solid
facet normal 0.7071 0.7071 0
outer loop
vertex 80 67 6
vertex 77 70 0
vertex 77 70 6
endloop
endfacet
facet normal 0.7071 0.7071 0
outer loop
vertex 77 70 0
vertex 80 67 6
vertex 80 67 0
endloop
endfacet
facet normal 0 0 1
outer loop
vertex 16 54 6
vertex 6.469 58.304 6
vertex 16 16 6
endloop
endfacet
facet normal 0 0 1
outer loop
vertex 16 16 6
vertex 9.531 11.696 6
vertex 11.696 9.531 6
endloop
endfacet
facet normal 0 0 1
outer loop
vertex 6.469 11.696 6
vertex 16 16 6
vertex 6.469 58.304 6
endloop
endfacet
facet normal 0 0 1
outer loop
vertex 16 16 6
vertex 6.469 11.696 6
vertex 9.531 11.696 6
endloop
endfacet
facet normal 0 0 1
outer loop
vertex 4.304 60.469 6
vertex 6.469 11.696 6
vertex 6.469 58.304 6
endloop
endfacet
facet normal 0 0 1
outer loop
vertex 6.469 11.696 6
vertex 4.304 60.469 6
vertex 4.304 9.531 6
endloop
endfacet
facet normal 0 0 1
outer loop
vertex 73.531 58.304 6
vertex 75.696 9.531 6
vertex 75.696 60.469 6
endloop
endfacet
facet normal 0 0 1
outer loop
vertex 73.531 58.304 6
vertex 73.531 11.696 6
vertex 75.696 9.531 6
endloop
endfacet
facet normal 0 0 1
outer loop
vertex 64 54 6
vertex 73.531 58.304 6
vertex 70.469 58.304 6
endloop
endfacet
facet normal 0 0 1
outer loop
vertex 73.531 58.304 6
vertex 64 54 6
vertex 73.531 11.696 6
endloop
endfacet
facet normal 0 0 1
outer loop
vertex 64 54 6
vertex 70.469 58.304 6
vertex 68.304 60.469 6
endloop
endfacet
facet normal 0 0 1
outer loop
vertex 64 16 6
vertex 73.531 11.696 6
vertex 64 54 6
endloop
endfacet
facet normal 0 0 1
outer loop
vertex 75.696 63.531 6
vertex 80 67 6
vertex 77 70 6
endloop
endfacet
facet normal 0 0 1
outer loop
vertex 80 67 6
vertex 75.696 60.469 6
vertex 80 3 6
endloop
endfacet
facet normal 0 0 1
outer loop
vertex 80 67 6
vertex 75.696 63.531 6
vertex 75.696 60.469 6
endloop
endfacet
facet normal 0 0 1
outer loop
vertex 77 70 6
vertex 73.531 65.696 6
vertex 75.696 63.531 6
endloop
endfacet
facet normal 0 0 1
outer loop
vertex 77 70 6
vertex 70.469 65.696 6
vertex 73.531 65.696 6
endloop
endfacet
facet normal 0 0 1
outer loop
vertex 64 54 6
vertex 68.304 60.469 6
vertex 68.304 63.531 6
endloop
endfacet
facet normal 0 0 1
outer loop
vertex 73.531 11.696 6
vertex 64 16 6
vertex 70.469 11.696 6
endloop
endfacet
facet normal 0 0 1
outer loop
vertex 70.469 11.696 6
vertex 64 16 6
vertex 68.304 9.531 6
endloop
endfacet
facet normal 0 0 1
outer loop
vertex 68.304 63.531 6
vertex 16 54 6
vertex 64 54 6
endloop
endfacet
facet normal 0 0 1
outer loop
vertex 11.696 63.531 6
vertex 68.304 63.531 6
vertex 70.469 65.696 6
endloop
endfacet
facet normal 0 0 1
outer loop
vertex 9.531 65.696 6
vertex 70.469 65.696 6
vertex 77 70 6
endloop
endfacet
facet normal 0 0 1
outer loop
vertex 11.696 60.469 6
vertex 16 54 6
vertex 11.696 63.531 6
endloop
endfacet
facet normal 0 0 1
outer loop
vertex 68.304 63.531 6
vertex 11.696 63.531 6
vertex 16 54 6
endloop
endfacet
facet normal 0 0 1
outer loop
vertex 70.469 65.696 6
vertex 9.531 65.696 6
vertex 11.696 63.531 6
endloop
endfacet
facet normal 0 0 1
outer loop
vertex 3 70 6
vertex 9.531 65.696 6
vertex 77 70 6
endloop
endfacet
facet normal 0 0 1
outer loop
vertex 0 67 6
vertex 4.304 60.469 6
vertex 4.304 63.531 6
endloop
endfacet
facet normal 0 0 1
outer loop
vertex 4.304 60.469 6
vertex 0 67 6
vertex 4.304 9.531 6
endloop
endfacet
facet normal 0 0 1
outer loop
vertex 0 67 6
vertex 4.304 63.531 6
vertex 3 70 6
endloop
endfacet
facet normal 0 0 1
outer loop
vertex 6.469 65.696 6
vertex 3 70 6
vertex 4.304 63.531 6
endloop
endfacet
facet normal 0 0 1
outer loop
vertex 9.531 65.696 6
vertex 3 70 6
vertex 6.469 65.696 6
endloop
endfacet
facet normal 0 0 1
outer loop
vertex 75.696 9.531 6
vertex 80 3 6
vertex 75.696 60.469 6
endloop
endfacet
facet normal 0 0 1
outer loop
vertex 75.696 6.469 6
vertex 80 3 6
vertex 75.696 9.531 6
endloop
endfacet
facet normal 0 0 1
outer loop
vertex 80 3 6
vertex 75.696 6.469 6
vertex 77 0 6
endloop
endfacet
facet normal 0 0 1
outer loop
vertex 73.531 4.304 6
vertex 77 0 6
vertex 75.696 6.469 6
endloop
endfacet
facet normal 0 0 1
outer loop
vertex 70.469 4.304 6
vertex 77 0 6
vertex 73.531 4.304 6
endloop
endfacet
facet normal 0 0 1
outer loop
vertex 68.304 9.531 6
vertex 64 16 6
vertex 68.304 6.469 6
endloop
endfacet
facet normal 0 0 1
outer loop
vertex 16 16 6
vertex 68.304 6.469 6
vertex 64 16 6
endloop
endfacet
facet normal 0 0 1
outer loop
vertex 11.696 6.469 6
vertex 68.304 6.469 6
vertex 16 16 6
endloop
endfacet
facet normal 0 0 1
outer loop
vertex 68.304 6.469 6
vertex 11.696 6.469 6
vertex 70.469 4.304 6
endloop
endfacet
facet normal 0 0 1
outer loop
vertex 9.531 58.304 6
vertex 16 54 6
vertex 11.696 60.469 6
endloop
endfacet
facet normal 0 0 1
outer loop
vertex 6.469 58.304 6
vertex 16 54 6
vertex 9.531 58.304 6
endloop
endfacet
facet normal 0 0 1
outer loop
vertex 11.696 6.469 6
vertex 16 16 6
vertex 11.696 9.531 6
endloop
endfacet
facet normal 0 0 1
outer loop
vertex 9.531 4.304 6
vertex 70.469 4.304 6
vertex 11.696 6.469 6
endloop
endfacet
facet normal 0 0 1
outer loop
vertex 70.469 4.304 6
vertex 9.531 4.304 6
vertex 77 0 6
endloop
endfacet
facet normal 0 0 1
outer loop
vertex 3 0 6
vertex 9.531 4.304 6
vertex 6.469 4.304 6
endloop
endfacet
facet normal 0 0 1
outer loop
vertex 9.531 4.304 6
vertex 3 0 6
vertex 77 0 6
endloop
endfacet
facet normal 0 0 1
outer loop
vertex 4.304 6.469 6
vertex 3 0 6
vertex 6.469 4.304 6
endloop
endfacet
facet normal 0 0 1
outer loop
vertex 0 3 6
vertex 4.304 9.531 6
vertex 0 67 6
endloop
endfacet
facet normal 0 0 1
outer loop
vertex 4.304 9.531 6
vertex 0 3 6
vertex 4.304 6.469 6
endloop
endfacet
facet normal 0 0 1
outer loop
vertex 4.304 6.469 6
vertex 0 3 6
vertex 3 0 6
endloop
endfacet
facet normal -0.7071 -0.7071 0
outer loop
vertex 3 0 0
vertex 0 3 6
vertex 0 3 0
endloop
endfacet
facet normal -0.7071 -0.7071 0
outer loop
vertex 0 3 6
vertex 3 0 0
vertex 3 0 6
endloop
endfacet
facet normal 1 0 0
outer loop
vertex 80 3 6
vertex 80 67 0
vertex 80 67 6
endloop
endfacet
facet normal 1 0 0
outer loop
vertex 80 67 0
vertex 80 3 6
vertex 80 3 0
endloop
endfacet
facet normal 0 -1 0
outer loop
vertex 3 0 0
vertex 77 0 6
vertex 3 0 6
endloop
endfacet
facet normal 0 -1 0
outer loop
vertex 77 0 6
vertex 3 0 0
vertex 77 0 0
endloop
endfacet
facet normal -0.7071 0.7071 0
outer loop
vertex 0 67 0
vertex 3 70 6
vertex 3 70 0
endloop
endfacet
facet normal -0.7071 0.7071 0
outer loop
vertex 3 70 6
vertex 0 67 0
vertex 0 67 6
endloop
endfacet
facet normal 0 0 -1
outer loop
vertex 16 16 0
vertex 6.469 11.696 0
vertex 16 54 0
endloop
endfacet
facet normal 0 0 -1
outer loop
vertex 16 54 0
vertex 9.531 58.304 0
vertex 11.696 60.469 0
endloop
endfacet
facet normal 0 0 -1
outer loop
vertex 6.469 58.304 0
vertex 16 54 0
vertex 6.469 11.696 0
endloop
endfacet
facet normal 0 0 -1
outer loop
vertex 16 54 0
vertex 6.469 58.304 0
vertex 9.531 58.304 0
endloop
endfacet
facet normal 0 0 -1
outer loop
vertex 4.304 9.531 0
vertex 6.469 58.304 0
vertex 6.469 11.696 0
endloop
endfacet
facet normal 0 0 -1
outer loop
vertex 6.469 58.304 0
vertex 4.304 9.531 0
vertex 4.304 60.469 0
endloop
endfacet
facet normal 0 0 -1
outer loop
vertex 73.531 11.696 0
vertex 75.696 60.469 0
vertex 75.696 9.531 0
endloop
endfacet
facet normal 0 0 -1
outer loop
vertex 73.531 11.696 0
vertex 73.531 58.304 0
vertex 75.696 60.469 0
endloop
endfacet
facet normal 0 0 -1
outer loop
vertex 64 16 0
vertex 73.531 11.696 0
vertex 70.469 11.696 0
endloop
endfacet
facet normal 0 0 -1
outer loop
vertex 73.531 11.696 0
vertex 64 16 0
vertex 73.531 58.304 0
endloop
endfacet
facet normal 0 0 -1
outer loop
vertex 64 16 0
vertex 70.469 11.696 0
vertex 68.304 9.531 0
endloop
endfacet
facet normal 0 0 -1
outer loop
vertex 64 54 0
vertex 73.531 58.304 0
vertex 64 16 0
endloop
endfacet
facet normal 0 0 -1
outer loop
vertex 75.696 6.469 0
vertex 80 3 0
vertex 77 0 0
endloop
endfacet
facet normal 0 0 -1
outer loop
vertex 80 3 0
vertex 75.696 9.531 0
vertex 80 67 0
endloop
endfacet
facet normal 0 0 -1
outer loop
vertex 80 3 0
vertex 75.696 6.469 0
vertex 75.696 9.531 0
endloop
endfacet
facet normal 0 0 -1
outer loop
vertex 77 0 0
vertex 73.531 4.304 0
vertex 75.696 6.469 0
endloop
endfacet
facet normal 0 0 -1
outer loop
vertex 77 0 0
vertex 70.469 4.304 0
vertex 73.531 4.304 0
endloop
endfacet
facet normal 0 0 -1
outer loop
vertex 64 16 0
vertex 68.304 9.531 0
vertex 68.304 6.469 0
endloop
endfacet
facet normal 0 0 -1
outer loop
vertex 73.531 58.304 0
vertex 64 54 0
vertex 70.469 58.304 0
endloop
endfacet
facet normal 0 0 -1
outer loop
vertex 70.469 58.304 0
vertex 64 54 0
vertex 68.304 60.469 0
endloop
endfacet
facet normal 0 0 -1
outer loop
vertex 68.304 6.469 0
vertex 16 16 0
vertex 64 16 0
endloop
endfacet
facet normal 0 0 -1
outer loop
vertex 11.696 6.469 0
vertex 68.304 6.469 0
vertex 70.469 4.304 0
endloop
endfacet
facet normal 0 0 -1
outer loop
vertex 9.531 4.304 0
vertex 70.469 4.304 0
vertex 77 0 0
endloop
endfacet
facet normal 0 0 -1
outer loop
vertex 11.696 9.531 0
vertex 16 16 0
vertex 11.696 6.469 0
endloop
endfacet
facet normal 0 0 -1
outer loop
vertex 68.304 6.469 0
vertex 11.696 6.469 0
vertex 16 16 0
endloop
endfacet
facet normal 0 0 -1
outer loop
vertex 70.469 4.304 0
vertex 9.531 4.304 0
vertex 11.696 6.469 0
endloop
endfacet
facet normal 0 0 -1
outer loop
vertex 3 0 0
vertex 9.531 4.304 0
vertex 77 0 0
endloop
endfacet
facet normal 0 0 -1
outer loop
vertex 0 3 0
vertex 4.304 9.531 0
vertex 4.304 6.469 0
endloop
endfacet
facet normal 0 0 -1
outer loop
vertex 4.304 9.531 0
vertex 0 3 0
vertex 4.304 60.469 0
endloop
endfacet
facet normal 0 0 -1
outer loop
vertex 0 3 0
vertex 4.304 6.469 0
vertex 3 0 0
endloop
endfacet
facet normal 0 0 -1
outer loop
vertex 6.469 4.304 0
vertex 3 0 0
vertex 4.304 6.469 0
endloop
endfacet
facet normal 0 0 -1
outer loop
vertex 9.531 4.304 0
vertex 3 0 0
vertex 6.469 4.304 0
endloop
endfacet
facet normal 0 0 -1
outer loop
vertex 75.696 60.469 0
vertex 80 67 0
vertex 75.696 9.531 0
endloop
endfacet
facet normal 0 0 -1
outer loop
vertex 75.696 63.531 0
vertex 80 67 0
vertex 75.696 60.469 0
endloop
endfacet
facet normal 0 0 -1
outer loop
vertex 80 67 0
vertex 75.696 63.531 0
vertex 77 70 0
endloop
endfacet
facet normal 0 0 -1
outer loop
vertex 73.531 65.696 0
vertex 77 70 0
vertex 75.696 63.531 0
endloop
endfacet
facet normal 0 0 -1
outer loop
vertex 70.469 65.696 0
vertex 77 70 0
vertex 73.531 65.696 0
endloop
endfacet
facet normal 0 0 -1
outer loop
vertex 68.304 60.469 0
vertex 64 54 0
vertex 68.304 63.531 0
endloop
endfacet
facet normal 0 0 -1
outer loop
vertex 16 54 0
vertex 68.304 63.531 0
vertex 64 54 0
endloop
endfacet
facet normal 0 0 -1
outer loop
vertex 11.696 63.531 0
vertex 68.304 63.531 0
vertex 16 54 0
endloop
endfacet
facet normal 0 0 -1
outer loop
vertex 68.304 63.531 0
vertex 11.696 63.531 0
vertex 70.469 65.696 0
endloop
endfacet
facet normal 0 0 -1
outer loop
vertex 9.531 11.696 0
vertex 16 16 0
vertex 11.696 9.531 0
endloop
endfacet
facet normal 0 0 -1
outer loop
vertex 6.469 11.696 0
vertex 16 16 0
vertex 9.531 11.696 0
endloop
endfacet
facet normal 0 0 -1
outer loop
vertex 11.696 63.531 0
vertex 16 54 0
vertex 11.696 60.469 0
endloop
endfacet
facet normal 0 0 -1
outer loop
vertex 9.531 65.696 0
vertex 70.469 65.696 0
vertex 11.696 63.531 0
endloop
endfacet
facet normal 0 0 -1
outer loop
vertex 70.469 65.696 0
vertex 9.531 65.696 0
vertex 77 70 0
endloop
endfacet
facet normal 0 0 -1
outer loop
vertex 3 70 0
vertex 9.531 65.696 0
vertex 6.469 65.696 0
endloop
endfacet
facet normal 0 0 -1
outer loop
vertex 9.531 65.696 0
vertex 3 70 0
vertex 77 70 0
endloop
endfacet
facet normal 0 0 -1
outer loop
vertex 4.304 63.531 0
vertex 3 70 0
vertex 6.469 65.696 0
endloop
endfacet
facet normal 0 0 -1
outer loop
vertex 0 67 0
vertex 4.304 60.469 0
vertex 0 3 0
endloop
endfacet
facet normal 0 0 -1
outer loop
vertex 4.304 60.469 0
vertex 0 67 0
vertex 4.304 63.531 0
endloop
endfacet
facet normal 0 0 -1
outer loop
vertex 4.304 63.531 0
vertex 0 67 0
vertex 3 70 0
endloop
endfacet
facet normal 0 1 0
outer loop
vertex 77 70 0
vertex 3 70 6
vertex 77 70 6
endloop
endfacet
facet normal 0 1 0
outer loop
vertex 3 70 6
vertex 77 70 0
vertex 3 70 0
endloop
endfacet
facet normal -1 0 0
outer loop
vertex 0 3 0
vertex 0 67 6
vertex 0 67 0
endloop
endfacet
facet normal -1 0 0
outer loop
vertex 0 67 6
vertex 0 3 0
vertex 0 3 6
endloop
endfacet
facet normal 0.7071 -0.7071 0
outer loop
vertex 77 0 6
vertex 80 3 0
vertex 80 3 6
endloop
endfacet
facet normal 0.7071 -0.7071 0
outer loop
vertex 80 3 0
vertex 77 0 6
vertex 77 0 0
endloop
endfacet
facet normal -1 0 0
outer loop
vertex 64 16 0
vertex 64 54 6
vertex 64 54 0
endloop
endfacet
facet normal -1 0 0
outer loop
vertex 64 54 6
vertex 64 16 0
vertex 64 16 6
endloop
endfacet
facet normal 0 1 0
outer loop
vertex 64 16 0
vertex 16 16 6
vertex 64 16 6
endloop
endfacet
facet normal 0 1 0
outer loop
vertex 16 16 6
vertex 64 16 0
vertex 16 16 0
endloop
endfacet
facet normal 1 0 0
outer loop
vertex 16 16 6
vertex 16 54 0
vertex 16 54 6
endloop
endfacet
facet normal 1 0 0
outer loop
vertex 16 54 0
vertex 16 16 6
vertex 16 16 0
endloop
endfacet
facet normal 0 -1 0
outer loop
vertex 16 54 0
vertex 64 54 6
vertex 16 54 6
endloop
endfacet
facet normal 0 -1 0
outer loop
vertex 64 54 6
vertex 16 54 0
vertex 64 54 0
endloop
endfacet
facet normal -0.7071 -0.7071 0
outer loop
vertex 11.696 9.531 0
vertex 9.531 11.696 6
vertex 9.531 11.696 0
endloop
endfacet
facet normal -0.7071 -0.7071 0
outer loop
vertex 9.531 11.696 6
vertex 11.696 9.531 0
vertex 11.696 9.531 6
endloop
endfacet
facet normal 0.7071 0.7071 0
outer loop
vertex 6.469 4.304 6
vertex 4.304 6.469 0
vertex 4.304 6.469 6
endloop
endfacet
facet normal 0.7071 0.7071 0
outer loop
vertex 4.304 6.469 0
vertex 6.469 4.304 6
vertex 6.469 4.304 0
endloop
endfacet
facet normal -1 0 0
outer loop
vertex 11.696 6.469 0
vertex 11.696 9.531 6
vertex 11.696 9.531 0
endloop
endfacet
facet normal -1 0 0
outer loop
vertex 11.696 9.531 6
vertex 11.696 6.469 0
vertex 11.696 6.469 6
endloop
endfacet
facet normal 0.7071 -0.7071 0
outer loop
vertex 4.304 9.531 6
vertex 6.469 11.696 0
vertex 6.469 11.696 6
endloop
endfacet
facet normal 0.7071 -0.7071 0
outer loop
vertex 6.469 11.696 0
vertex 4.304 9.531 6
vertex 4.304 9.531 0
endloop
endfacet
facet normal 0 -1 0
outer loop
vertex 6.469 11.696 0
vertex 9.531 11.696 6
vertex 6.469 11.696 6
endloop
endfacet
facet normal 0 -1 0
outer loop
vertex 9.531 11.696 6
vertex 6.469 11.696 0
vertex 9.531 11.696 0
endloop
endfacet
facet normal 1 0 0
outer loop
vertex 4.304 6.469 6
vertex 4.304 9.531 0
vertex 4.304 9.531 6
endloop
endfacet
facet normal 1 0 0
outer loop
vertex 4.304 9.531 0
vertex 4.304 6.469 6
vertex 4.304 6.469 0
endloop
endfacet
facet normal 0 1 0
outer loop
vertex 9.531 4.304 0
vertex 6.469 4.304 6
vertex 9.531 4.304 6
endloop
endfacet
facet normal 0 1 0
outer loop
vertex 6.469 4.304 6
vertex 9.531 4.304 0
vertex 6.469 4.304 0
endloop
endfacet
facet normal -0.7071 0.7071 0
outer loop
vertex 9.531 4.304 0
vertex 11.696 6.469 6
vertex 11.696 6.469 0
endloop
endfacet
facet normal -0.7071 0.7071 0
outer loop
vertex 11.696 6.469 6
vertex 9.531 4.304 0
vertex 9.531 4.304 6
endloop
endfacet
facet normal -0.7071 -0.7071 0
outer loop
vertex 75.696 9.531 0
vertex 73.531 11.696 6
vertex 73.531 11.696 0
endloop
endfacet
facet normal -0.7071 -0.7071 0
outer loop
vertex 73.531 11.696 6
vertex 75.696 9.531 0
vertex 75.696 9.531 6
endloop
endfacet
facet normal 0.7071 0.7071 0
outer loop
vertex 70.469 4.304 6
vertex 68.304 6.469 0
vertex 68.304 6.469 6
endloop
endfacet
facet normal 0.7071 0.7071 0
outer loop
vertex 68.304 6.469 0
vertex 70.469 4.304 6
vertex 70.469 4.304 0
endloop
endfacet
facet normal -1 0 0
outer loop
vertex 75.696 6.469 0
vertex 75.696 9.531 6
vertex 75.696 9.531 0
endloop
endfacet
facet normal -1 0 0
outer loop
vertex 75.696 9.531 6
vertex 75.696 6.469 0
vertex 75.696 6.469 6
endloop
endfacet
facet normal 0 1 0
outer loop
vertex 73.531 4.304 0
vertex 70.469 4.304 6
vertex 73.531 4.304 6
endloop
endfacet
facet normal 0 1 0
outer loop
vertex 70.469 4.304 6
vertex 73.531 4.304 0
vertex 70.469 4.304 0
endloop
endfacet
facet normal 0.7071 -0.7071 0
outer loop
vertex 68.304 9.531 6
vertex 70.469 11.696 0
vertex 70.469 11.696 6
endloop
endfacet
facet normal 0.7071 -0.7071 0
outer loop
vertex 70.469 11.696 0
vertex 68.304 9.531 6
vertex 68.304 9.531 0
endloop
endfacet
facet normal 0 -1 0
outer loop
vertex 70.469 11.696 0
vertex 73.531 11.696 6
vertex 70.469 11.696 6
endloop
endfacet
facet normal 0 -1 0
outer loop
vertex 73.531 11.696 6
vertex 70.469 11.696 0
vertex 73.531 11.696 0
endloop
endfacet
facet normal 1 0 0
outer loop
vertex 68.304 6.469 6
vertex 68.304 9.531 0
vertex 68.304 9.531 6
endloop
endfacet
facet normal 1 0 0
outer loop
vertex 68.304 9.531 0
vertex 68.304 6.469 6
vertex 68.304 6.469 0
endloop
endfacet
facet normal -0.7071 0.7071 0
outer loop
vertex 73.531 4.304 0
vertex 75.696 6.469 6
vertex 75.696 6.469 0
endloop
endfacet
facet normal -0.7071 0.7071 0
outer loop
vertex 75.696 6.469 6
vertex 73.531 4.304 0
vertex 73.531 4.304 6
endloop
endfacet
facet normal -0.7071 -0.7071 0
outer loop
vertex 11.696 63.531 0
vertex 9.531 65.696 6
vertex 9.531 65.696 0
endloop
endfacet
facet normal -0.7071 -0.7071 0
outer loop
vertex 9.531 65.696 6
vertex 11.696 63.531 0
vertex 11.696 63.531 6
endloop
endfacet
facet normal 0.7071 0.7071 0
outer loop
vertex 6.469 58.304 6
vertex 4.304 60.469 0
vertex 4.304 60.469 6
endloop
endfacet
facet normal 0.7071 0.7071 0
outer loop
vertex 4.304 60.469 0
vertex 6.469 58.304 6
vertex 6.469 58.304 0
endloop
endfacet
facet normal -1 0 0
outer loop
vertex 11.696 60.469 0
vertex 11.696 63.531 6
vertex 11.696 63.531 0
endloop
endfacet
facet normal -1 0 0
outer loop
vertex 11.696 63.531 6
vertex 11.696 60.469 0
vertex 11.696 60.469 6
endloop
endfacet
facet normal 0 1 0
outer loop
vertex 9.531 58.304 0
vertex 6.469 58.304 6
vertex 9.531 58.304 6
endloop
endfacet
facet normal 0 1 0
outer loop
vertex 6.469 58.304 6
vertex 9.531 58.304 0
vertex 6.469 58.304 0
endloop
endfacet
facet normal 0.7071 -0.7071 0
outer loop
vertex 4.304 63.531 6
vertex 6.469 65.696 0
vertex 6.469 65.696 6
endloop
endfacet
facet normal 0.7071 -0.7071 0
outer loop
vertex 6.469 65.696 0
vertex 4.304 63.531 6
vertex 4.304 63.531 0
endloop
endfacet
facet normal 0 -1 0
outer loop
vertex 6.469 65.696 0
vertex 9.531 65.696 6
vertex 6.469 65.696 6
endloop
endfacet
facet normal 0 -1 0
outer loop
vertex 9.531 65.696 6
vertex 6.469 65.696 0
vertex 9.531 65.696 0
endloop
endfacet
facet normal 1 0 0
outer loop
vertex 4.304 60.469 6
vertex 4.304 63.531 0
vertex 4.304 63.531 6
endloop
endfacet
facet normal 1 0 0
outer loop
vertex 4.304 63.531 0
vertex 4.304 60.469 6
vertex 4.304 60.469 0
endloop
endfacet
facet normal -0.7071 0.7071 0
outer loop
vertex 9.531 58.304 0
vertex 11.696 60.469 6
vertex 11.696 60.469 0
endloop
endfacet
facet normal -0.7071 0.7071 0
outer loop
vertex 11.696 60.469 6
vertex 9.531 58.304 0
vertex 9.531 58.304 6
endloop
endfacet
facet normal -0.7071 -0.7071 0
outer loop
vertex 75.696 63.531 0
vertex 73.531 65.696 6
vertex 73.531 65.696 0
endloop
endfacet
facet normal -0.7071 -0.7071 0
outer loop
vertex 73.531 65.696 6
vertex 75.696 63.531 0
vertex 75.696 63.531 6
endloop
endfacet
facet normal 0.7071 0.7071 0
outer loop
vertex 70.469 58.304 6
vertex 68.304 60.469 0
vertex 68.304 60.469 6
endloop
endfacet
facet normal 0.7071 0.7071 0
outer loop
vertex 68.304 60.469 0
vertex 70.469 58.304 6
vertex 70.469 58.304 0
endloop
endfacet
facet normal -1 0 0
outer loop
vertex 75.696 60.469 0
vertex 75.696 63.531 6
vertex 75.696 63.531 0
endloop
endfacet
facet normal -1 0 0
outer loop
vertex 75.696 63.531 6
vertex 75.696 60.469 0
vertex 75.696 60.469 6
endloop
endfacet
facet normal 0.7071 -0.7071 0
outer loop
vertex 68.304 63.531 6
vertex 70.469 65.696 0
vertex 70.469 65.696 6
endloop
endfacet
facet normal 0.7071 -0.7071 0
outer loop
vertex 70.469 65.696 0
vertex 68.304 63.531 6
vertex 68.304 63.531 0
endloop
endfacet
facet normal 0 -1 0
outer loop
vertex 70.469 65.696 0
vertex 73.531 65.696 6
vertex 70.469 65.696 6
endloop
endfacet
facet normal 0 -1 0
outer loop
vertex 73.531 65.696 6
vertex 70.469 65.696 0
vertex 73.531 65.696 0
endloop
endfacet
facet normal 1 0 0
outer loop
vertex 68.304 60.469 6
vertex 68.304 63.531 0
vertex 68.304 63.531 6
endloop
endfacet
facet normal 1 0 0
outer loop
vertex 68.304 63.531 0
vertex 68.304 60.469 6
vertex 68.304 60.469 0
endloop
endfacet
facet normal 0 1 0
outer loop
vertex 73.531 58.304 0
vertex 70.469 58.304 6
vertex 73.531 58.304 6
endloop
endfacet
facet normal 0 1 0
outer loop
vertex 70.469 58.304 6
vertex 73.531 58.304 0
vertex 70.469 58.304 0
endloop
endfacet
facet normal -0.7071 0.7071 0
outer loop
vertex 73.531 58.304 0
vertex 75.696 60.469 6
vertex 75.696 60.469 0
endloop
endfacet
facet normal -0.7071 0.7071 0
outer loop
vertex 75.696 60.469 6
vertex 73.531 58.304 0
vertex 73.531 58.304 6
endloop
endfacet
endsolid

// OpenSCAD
$fn = 32;

// ----------------------------------------------------------------------
// Frame plate: 80 x 70 frame, 16 mm rails
// ----------------------------------------------------------------------

// --- parameters (mm) ---
plate_l = 80;             // plate length, X
plate_w = 70;             // plate width, Y
plate_t = 6;              // plate thickness, Z (extrusion height)
corner_c = 3;             // corner chamfer
frame_bar = 16;           // frame rail width
bolt_r = 4;               // corner bolt window radius
bolt_inset = 8;           // bolt centre inset from the edges

win_l = plate_l - 2 * frame_bar;  // window length
win_w = plate_w - 2 * frame_bar;  // window width
bolt_d = 2 * bolt_r;  // corner hole diameter

profile = [[3, 0], [77, 0], [80, 3], [80, 67], [77, 70], [3, 70], [0, 67], [0, 3]];  // primary outline, 8 points, counter clockwise
void_1 = [[16, 16], [64, 16], [64, 54], [16, 54]];  // the window, 4 points
void_2 = [[11.696, 9.531], [9.531, 11.696], [6.469, 11.696], [4.304, 9.531], [4.304, 6.469], [6.469, 4.304], [9.531, 4.304], [11.696, 6.469]];  // corner bolt window, 8 points
void_3 = [[75.696, 9.531], [73.531, 11.696], [70.469, 11.696], [68.304, 9.531], [68.304, 6.469], [70.469, 4.304], [73.531, 4.304], [75.696, 6.469]];  // corner bolt window, 8 points
void_4 = [[11.696, 63.531], [9.531, 65.696], [6.469, 65.696], [4.304, 63.531], [4.304, 60.469], [6.469, 58.304], [9.531, 58.304], [11.696, 60.469]];  // corner bolt window, 8 points
void_5 = [[75.696, 63.531], [73.531, 65.696], [70.469, 65.696], [68.304, 63.531], [68.304, 60.469], [70.469, 58.304], [73.531, 58.304], [75.696, 60.469]];  // corner bolt window, 8 points

// --- the one profile operation ---
difference() {
  linear_extrude(height = plate_t) polygon(points = profile);
  translate([0, 0, -1])
    linear_extrude(height = plate_t + 2) polygon(points = void_1);
  translate([0, 0, -1])
    linear_extrude(height = plate_t + 2) polygon(points = void_2);
  translate([0, 0, -1])
    linear_extrude(height = plate_t + 2) polygon(points = void_3);
  translate([0, 0, -1])
    linear_extrude(height = plate_t + 2) polygon(points = void_4);
  translate([0, 0, -1])
    linear_extrude(height = plate_t + 2) polygon(points = void_5);
}
